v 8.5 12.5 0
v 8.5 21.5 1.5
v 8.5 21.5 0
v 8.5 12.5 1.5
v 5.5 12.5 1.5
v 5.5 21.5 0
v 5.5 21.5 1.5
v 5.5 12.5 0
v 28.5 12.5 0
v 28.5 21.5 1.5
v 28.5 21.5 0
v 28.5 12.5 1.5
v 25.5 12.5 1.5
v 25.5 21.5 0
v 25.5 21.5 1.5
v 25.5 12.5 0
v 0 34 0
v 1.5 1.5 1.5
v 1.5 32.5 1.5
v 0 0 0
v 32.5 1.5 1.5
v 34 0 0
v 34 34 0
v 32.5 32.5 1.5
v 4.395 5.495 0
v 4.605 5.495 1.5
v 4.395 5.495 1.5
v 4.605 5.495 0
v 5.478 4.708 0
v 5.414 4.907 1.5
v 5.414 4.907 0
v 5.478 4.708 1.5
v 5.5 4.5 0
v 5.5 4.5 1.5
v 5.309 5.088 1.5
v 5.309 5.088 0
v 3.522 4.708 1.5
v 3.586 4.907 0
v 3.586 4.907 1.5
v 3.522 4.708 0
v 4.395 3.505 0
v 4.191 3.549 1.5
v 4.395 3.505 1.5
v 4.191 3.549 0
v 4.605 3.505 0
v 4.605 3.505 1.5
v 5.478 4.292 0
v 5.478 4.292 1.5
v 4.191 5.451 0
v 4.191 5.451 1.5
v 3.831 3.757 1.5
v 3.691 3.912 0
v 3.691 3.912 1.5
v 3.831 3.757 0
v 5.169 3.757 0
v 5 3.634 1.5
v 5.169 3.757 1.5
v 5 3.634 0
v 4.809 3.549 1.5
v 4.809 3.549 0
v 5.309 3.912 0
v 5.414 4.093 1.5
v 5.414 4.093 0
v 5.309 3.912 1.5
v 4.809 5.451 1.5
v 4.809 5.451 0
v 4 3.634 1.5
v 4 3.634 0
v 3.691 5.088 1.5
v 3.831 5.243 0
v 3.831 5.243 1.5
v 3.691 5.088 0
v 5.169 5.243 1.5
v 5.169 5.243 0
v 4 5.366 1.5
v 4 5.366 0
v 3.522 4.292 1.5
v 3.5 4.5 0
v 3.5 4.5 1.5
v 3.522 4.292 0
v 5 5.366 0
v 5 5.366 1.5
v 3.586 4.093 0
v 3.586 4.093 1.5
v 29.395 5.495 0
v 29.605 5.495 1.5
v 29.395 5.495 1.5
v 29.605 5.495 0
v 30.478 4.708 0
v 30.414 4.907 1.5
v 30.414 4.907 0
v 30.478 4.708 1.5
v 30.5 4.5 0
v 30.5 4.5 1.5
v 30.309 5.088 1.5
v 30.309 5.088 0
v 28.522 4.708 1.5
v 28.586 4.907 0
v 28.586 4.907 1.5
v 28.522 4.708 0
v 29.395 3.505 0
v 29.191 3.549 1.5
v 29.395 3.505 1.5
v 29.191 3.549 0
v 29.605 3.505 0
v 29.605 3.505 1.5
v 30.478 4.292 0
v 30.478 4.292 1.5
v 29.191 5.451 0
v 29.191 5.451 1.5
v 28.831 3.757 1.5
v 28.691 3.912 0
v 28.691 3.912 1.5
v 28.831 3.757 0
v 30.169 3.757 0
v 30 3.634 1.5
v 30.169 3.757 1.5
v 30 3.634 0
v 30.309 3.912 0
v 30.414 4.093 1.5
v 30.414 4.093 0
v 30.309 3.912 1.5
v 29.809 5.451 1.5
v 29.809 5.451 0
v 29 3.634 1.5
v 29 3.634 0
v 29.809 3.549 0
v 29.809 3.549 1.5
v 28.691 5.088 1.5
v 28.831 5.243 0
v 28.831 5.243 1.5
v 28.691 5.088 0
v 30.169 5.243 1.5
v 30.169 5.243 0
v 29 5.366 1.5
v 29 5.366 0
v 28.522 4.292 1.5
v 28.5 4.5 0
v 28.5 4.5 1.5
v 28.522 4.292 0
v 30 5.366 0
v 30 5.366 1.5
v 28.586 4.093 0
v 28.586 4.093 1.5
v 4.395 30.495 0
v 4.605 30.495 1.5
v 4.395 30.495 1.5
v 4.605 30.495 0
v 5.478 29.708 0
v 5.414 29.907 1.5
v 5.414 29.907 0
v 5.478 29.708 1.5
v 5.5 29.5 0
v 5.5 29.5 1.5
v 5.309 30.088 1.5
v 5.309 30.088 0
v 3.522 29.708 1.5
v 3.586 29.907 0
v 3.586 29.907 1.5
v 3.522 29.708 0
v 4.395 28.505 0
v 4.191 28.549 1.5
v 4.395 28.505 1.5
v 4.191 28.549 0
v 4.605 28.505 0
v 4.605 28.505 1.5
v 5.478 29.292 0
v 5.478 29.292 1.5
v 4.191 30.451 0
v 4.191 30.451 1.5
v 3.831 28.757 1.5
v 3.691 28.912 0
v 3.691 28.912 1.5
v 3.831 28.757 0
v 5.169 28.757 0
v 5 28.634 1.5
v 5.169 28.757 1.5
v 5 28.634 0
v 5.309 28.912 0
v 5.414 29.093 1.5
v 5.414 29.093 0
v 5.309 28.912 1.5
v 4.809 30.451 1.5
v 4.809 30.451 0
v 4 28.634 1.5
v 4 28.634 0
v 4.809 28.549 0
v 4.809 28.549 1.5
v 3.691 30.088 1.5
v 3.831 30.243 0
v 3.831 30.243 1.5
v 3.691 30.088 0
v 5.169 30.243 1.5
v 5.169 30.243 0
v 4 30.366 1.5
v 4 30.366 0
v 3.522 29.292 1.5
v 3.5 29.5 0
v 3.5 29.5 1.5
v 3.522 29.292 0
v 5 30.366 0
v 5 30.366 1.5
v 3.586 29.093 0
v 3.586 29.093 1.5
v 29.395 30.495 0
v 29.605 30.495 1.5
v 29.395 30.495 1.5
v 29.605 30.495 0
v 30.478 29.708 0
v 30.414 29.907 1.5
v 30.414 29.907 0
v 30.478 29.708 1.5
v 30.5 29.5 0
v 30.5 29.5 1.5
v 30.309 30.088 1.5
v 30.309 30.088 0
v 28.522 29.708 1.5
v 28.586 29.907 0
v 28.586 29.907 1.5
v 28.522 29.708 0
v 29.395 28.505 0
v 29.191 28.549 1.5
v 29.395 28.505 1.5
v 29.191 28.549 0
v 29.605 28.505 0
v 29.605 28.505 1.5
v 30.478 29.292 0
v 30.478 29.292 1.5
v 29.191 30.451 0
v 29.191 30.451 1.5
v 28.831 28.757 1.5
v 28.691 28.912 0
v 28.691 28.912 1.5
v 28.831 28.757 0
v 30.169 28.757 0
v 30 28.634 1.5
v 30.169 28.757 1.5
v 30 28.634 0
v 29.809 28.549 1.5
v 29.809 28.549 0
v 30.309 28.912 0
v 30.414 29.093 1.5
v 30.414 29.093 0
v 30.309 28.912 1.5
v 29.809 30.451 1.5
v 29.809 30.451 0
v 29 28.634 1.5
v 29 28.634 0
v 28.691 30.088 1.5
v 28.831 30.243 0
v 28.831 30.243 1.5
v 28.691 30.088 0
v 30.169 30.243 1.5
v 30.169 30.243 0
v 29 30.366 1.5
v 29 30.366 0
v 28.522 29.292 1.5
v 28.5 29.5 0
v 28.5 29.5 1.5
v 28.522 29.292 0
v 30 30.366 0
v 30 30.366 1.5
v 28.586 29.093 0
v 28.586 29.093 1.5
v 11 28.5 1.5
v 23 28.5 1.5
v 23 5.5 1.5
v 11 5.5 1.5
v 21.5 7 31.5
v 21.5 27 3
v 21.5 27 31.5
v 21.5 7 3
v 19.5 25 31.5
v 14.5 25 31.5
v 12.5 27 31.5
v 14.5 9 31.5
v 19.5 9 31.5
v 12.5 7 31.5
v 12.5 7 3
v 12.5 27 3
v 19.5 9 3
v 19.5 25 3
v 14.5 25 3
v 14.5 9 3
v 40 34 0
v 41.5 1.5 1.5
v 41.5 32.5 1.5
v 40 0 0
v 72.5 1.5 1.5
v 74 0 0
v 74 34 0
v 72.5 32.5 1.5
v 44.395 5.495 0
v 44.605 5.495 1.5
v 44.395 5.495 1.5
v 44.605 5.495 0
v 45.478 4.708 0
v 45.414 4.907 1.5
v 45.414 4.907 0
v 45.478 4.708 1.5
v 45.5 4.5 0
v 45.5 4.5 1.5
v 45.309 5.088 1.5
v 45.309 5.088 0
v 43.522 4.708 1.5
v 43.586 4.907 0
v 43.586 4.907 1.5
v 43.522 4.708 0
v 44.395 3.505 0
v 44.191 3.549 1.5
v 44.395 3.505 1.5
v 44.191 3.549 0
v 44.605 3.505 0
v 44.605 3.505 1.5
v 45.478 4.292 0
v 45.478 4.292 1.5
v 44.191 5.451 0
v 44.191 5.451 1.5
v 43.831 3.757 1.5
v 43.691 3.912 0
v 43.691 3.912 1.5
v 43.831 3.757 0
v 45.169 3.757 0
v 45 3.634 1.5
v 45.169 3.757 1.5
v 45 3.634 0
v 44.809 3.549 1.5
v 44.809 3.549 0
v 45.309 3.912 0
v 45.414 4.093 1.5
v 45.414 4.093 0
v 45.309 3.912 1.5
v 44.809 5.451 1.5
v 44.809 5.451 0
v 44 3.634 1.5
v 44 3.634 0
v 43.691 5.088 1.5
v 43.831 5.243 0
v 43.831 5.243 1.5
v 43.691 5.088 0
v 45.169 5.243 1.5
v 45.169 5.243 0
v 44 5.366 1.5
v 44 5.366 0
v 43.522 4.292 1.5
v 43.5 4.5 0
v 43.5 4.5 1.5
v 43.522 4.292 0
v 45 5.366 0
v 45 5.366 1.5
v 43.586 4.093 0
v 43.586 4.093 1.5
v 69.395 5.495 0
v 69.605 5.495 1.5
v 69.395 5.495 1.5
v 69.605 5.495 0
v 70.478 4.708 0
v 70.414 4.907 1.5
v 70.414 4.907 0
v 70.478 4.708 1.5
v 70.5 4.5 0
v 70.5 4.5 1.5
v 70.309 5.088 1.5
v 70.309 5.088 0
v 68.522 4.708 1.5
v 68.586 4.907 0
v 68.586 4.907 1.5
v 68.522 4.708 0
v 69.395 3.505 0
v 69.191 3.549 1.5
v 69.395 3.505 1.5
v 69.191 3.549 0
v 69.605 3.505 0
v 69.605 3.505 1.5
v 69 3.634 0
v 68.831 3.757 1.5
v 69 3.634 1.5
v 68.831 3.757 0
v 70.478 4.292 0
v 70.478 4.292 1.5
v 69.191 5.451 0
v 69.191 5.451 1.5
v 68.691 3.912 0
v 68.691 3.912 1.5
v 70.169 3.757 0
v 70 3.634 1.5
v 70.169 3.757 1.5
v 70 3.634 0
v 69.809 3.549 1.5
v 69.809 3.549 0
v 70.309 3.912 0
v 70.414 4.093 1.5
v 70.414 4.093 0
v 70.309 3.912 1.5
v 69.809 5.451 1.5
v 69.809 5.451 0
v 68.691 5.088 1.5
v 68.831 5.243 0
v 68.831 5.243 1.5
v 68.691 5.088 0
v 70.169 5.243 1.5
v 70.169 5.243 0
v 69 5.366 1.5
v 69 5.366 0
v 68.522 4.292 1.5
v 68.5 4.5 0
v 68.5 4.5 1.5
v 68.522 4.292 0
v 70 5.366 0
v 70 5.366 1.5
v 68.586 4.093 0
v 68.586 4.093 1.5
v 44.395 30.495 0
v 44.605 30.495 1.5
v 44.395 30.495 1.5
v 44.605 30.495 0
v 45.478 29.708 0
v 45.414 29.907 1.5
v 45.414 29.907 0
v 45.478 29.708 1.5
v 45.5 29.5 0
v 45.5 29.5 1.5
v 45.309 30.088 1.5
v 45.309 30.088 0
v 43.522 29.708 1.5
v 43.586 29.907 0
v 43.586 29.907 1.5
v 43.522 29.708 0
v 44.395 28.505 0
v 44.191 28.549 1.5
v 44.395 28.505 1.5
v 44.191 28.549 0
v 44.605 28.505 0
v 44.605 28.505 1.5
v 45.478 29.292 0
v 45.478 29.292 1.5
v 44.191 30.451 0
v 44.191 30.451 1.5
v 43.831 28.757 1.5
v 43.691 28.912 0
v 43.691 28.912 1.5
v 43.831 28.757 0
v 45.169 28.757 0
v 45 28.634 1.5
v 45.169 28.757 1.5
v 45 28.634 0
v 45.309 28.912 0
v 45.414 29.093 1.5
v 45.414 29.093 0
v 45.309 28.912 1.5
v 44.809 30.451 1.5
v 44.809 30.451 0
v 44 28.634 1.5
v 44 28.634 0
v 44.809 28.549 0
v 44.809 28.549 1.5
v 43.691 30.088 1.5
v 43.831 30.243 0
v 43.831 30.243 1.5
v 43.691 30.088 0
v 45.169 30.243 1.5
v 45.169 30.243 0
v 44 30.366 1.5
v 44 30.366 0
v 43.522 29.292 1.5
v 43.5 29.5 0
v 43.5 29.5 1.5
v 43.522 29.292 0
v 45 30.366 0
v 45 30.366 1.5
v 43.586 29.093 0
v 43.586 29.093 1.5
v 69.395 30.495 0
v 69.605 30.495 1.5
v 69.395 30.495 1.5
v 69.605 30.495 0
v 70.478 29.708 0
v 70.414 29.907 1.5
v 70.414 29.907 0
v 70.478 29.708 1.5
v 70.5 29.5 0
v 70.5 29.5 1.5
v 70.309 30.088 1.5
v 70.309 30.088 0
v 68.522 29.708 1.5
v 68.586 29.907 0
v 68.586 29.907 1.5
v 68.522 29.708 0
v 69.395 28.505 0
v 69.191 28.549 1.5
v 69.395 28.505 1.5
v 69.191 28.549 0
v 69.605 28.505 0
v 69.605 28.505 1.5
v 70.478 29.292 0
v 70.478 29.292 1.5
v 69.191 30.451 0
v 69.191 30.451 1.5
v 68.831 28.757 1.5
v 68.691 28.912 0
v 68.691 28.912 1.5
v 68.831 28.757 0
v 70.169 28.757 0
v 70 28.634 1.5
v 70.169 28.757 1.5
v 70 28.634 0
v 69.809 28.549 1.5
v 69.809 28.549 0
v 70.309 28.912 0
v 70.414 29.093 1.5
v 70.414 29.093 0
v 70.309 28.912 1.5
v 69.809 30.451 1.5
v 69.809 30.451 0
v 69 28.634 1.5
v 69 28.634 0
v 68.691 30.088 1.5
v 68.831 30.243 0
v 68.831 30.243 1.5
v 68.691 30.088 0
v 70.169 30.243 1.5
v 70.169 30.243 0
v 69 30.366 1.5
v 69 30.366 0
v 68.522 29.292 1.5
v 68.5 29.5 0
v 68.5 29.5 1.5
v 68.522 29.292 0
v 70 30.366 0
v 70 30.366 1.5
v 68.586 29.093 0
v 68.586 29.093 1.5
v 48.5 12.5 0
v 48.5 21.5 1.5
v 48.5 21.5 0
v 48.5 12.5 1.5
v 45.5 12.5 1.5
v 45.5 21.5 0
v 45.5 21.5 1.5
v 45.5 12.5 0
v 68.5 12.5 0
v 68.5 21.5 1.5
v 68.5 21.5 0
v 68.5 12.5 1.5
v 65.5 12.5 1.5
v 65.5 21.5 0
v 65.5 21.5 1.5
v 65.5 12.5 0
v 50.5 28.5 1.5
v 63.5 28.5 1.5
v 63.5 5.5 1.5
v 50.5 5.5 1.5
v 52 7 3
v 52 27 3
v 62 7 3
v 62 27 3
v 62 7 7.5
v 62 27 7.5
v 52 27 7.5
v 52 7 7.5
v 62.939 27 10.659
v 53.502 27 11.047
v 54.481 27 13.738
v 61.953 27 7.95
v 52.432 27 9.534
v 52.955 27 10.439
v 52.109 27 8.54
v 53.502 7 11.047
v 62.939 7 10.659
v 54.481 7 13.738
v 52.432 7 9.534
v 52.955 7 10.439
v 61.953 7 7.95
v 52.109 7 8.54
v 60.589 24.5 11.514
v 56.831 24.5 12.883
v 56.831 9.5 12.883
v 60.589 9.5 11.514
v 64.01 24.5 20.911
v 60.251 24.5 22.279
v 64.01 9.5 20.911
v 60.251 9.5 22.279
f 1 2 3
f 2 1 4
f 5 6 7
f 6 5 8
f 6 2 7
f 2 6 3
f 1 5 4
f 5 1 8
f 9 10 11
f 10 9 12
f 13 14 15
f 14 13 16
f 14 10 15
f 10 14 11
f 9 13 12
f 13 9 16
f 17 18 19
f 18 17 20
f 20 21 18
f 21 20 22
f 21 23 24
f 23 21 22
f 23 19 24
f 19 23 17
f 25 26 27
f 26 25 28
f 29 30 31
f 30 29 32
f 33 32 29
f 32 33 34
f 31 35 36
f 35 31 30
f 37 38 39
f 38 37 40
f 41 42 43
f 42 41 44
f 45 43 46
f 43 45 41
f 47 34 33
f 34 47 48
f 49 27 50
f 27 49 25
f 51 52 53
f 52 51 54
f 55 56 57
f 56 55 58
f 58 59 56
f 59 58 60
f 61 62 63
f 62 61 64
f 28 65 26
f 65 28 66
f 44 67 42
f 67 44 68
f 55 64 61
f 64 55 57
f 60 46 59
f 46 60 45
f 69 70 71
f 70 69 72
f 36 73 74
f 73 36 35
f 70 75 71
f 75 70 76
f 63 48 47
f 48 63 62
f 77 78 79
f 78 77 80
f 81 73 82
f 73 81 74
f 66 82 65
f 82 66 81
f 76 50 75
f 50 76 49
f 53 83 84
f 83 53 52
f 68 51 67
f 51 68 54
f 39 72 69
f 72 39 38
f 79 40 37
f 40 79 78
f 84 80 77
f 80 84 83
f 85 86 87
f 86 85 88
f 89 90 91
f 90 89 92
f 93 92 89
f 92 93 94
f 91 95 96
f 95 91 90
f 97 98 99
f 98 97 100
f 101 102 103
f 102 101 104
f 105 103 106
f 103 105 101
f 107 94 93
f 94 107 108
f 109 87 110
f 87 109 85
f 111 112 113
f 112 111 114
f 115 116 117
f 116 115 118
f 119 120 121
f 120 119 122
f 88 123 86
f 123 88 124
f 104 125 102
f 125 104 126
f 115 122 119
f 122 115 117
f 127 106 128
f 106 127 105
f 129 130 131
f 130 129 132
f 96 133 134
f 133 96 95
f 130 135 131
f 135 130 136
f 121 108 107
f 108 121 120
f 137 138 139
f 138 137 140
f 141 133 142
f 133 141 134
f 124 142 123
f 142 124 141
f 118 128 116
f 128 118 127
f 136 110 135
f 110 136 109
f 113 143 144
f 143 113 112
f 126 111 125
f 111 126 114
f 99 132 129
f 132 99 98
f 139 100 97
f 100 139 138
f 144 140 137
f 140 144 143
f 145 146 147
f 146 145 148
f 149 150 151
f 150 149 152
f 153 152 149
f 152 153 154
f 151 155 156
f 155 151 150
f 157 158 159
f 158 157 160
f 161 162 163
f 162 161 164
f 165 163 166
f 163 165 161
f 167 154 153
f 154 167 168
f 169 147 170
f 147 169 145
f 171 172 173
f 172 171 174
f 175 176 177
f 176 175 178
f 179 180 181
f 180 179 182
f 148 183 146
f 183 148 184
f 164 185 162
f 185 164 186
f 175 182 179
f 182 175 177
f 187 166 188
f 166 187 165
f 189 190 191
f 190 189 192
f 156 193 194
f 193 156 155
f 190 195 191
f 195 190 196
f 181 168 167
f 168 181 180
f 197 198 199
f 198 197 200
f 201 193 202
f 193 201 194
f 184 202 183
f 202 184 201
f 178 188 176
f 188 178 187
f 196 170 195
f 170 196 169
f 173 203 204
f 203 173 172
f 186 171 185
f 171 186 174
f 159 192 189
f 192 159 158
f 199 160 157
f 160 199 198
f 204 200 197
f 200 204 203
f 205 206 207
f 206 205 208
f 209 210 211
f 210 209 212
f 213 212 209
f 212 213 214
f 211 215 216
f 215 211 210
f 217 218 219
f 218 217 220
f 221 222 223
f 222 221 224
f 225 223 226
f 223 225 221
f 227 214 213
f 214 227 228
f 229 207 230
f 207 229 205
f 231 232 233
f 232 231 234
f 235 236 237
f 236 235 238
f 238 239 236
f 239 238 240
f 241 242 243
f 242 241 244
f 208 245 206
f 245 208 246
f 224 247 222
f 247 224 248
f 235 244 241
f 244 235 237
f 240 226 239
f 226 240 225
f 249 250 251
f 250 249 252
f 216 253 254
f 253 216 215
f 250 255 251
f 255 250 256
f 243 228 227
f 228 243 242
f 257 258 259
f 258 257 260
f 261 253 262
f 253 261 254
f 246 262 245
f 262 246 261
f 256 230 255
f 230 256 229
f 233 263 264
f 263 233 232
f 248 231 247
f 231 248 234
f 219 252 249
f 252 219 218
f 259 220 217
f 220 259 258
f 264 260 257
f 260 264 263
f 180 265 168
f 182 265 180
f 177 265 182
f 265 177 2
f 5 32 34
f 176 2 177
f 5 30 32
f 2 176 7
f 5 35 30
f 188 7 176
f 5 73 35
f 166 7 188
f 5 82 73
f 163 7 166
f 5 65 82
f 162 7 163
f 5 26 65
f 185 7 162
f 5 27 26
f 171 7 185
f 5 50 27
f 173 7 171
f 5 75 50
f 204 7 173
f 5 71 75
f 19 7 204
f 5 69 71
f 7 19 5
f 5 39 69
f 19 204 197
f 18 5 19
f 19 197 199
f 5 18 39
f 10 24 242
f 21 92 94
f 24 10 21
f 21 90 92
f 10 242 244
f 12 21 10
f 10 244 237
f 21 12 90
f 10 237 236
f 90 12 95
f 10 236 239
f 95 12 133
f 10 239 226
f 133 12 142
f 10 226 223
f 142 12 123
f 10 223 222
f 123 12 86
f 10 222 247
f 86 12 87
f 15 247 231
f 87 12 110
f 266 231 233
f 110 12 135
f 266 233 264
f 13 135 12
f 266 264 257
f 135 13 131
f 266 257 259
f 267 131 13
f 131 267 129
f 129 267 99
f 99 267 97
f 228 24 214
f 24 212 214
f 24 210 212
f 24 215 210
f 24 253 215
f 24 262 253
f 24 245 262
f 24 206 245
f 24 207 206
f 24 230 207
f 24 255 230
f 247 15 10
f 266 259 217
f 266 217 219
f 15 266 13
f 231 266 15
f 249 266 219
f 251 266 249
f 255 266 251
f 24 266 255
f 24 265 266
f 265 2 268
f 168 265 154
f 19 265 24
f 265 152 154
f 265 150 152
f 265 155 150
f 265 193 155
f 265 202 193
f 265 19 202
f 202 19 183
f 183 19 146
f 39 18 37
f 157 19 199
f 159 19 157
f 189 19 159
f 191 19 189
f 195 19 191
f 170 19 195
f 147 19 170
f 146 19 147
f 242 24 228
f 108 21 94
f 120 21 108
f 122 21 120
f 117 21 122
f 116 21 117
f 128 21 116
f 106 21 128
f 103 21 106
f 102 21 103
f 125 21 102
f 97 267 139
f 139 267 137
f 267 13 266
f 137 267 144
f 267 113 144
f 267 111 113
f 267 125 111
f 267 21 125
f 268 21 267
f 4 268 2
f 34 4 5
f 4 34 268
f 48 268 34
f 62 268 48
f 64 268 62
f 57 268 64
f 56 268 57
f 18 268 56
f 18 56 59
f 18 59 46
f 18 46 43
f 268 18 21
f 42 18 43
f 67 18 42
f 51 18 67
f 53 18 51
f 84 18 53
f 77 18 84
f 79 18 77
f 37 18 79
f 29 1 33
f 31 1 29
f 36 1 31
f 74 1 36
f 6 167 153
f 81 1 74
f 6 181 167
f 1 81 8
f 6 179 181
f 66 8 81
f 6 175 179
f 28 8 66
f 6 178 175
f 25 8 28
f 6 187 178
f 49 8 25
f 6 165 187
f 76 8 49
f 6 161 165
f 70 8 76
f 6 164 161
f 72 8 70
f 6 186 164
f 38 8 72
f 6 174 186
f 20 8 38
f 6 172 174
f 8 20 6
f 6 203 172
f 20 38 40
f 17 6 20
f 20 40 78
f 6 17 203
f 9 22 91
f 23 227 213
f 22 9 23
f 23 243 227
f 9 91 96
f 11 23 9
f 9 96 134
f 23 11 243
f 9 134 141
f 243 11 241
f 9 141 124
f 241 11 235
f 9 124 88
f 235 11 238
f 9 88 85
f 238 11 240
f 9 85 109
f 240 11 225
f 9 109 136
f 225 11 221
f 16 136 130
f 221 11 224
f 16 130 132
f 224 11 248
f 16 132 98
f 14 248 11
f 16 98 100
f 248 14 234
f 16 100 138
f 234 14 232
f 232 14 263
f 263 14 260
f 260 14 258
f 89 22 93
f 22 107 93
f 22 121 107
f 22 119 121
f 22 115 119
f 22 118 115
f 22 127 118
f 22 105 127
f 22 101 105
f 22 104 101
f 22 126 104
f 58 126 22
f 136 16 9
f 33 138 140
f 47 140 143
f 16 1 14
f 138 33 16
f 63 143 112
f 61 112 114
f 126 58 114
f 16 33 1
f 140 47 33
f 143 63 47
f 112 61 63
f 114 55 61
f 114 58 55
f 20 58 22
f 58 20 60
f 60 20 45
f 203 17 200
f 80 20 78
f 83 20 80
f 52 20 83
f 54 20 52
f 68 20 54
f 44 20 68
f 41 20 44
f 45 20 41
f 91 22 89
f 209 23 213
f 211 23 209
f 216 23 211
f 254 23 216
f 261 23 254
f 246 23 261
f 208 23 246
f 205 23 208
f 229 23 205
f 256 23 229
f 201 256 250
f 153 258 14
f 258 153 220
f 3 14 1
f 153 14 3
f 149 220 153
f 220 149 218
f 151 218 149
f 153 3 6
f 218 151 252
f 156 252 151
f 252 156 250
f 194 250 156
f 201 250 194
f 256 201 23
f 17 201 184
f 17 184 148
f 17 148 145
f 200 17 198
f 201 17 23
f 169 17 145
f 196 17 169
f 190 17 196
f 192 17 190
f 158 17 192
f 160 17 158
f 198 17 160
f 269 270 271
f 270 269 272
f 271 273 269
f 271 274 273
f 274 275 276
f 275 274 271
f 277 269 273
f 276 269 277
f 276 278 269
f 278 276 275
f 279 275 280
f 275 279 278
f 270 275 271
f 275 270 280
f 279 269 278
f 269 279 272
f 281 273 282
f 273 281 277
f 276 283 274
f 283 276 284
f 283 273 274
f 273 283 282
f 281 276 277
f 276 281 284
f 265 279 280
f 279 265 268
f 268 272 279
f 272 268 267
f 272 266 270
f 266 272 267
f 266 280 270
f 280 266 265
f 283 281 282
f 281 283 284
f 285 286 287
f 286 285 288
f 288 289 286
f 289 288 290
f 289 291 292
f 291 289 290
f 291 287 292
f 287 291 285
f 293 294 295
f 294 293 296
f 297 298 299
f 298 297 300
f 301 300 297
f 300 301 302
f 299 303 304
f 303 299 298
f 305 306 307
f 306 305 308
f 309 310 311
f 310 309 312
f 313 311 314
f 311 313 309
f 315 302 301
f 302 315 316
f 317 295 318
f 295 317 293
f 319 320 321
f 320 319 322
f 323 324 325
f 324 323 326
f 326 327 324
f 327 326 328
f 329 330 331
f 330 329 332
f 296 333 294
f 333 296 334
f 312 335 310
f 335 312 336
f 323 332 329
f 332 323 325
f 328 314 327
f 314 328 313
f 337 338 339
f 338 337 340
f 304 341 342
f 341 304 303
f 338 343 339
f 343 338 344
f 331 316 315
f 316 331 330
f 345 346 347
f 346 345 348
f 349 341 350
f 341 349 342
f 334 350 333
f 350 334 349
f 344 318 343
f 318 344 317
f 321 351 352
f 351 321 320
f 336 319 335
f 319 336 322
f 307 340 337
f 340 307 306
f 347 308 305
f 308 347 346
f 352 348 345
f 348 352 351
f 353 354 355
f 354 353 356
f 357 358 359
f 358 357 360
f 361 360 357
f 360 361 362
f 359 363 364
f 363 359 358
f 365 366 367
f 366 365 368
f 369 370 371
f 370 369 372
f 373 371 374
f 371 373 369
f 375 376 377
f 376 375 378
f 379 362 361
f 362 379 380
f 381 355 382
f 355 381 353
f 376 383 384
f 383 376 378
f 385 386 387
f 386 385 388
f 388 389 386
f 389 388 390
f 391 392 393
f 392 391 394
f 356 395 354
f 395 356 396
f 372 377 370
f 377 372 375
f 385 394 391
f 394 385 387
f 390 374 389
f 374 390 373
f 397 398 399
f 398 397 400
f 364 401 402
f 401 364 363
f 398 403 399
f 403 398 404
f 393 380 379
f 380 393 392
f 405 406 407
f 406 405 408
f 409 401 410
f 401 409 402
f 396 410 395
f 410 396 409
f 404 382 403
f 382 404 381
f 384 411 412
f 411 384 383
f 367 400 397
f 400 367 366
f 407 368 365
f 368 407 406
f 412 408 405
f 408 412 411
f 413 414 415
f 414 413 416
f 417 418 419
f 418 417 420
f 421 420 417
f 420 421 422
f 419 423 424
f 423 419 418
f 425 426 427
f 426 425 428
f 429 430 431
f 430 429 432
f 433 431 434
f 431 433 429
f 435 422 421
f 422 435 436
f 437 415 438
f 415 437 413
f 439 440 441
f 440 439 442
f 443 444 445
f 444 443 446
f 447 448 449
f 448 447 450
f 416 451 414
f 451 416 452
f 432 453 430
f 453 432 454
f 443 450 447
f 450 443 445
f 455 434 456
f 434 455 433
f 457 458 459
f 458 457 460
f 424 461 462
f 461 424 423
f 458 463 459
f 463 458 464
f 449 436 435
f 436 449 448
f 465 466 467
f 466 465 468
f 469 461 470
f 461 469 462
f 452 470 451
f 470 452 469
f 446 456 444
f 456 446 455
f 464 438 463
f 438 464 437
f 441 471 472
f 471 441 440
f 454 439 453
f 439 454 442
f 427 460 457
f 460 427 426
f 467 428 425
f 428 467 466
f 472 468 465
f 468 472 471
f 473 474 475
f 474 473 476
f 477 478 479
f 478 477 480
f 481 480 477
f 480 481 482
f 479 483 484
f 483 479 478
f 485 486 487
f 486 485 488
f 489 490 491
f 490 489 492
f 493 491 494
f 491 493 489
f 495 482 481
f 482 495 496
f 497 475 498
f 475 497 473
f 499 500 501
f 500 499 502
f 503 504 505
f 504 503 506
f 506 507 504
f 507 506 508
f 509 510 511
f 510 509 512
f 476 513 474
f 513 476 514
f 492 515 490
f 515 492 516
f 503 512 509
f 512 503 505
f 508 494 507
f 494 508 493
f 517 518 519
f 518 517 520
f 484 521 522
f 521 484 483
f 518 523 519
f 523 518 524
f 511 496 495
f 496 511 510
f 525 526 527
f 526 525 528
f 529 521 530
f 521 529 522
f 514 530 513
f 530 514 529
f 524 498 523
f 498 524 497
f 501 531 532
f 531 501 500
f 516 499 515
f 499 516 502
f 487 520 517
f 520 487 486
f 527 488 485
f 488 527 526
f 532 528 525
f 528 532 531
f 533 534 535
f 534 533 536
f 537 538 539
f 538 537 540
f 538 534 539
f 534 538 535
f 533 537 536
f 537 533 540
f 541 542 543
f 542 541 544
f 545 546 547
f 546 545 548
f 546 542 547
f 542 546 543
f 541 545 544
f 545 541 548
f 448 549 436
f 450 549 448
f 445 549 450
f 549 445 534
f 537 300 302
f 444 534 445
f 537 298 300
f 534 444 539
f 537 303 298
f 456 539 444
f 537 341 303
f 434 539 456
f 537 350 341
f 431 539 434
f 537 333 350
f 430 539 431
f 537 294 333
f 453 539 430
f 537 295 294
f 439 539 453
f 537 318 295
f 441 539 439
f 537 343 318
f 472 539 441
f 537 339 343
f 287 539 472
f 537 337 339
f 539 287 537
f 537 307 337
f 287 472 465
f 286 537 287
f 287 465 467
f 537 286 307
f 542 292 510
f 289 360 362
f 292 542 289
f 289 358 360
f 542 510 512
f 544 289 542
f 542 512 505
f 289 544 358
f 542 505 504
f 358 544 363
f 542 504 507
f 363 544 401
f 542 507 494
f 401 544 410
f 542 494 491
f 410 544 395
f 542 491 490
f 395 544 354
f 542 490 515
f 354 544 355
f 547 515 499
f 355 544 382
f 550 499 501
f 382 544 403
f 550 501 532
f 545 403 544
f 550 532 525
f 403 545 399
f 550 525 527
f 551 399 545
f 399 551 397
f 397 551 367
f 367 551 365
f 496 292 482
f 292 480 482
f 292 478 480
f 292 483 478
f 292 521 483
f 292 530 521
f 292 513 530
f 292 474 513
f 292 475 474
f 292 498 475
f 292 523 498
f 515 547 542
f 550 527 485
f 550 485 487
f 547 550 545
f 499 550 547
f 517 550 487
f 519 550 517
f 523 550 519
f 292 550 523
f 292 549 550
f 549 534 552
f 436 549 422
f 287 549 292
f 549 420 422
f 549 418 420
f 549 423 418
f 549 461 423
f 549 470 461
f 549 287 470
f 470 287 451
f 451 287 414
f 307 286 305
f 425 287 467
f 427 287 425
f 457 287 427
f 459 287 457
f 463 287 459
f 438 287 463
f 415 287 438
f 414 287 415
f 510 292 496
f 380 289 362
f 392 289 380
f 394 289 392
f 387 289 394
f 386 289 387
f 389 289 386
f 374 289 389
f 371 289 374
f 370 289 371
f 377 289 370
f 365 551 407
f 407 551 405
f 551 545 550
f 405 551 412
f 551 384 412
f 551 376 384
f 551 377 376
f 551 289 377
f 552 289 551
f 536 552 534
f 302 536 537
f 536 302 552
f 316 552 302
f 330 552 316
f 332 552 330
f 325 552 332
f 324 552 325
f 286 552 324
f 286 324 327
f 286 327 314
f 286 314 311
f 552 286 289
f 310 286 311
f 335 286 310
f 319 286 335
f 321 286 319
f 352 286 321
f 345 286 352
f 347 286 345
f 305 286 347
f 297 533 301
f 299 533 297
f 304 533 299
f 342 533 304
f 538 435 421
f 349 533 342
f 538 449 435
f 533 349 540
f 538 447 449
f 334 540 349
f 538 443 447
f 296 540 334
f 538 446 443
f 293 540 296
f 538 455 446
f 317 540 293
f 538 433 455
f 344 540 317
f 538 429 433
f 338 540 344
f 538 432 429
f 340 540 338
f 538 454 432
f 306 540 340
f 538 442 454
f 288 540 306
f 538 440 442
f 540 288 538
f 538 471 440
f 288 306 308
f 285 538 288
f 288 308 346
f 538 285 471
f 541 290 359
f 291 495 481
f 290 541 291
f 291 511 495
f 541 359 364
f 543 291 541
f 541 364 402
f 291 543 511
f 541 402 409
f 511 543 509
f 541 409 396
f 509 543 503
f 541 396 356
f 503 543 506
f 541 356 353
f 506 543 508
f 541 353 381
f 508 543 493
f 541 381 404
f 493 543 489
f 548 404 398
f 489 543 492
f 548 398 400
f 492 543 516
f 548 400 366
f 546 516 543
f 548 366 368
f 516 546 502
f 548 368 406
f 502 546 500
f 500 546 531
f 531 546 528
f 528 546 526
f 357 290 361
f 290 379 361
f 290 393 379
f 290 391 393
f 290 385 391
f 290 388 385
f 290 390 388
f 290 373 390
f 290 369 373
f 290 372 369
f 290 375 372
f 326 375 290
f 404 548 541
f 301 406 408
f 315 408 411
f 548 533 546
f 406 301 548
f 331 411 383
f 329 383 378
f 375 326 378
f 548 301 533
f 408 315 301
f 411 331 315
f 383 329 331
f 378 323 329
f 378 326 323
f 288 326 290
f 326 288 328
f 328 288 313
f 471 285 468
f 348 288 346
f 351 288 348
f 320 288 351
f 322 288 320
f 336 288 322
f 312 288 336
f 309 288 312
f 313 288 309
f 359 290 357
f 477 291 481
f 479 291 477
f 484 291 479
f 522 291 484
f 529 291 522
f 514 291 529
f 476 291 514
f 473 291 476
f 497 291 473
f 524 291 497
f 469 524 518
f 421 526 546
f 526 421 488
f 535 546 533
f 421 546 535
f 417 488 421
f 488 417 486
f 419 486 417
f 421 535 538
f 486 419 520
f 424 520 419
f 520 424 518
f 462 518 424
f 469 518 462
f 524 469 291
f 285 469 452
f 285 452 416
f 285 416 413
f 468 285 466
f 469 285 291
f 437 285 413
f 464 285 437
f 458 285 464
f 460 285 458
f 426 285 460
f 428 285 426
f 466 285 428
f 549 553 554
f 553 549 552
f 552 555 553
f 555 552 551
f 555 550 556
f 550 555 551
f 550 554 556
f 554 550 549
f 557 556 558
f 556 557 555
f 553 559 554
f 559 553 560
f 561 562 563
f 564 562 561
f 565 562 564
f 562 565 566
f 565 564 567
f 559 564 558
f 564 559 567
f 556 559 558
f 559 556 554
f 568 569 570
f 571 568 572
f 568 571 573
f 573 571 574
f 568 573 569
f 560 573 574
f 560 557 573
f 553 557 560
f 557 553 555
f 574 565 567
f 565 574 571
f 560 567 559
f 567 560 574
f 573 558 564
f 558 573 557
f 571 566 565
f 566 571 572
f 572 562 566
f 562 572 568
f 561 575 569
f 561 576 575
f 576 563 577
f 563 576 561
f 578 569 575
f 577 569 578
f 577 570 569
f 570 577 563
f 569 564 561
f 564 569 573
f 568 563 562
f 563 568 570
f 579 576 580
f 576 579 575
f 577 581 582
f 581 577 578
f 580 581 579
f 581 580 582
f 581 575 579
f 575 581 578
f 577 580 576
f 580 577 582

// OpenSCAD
// title      : RoboGen parametric A part
// author     : Alice Concordel
// date     : 01.12.2016

//The parametric part is in two parts, A and B. They should be printed  as two parts then assembled with glue.
parametricJointPartA(0.03,0,0); //the first parameter is the length of the joint, the second parameter is the angle beta (only for non-planar robots)
translate([40, 0, 0]) parametricJointPartB(0,20,0); //the parameter is the angle of the parametric part

module parametricJointPartA(length, alpha, beta)
{
//plate parameters
	lengthSlide = 34;
	widthSlide = 34;
	heightSlide = 1.5;

	radiusHole = 1;

//wire hole parameters
	lengthWire = 3;
	widthWire = 9;
	heightWire = heightSlide;

//shaft part parameters
	lengthShaft = 20;
	widthShaft = 9;

// apply transformations to the parameter
length = length*1000; //convert to mm
	union()
	{
		difference()
		{
			// starting plate
			cube([lengthSlide,widthSlide,heightSlide]);
		
			union()
			{
			// chamfer the edges
				rotate ([0,-45,0]) cube([3,widthSlide,3]);
				rotate([45,0,0]) cube([lengthSlide,3,3]);
				translate([lengthSlide,0,0]) rotate([0,-45,0]) cube([3,widthSlide,3]);
				translate([0,widthSlide,0]) rotate([45,0,0]) cube([lengthSlide,3,3]);

			// holes in the plate
					//round
				translate([4.5,4.5,-0.5]) cylinder(r = radiusHole, h = heightSlide+1, $fn = 30);
				translate([lengthSlide-4.5,4.5,-0.5]) cylinder(r = radiusHole, h = heightSlide+1, $fn = 30);
				translate([4.5,widthSlide-4.5,-0.5]) cylinder(r = radiusHole, h = heightSlide+1, $fn = 30);
				translate([lengthSlide-4.5,widthSlide-4.5,-0.5]) cylinder(r = radiusHole, h = heightSlide+1, $fn = 30);
					
					//rectangular holes (only present if the shaft is not rotated)
				if(beta == 0){
				translate([7-lengthWire/2,widthSlide/2-widthWire/2,-0.5]) cube([lengthWire,widthWire,heightSlide+1]);
				translate([lengthSlide-7-lengthWire/2,widthSlide/2-widthWire/2,-0.5]) cube([lengthWire,widthWire,heightSlide+1]);
				}
			}
		}

	//the shaft
		//========================== beta paramter below: rotates the whole thing if needed
		translate([lengthSlide/2,widthSlide/2,0]) rotate([0,0,beta]) translate([-lengthSlide/2,-widthSlide/2,0]) 
	union()
	{
		//main long part 
		//========================== length parameter below
			difference()
			{
			translate([lengthSlide/2-widthShaft/2,widthSlide/2-lengthShaft/2,0]) cube([widthShaft,lengthShaft,length+heightSlide]);
			translate([lengthSlide/2-(widthShaft-4)/2,widthSlide/2-(lengthShaft-4)/2,heightSlide]) cube([widthShaft-4,lengthShaft-4,length+0.5]);
			}

		//chamfer the edges of the shaft base
			difference()
			{
				translate([lengthSlide/2-(widthShaft+3)/2,widthSlide/2-(lengthShaft+3)/2]) cube([widthShaft+3,lengthShaft+3,3]);
				union()
				{
				translate([lengthSlide/2-widthShaft/2-1.5,0,1.5]) rotate ([0,-45,0]) cube([1.5*sqrt(2),widthSlide,1.5*sqrt(2)]);
				translate([0,widthSlide/2-lengthShaft/2-1.5,1.5]) rotate([45,0,0]) cube([lengthSlide,1.5*sqrt(2),1.5*sqrt(2)]);
				translate([lengthSlide/2+widthShaft/2+1.5,0,1.5]) rotate([0,-45,0]) cube([1.5*sqrt(2),widthSlide,1.5*sqrt(2)]);
				translate([0,widthSlide/2+lengthShaft/2+1.5,1.5]) rotate([45,0,0]) cube([lengthSlide,1.5*sqrt(2),1.5*sqrt(2)]);
				}
			}
		}
	}
}

module parametricJointPartB(length,alpha,beta)
{
//plate parameters
	lengthSlide = 34;
	widthSlide = 34;
	heightSlide = 1.5;
	
	radiusHole = 1;

//wire hole parameters
	lengthWire = 3;
	widthWire = 9;
	heightWire = heightSlide;

//joint base parameters
	lengthBase = 10;
	widthBase = 20;
	heightBase = 6;
	
//cylinder parameters
	radiusCylinderBase = 5;
	heightCylinderBase = 20;
	
//rotating cube top part parameters
	lengthTop = 9;
	widthTop = 20;
	heightTop = 5;
	
	lengthEnd = 4;
	widthEnd = 15;
	heightEnd = 10;
	
	
	union()
	{
		difference()
		{
			// starting plate
			cube([lengthSlide,widthSlide,1.5]);
			
			union()
			{
			// chamfer the edges of the plate
				rotate ([0,-45,0]) cube([3,widthSlide,3]);
				rotate([45,0,0]) cube([lengthSlide,3,3]);
				translate([lengthSlide,0,0]) rotate([0,-45,0]) cube([3,widthSlide,3]);
				translate([0,widthSlide,0]) rotate([45,0,0]) cube([lengthSlide,3,3]);

			// holes in the plate
					//round holes
				translate([4.5,4.5,-0.5]) cylinder(r = radiusHole, h = heightSlide+1, $fn = 30);
				translate([lengthSlide-4.5,4.5,-0.5]) cylinder(r = radiusHole, h = heightSlide+1, $fn = 30);
				translate([4.5,widthSlide-4.5,-0.5]) cylinder(r = radiusHole, h = heightSlide+1, $fn = 30);
				translate([lengthSlide-4.5,widthSlide-4.5,-0.5]) cylinder(r = radiusHole, h = heightSlide+1, $fn = 30);
				
					//rectangular wire holes
				translate([7-lengthWire/2,widthSlide/2-widthWire/2,-0.5]) cube([lengthWire,widthWire,heightWire+1]);
				translate([lengthSlide-7-lengthWire/2,widthSlide/2-widthWire/2,-0.5]) cube([lengthWire,widthWire,heightWire+1]);
			}
		}
		// base of shaft part
		translate([lengthSlide/2-10/2,widthSlide/2-20/2,0]) cube([lengthBase,widthBase,heightBase+heightSlide]);
	
		//chamfer the edges of the shaft base
		difference()
		{
			translate([lengthSlide/2-(lengthBase+3)/2,widthSlide/2-(widthBase+3)/2]) cube([lengthBase+3,widthBase+3,3]);
			union()
			{
			translate([lengthSlide/2-lengthBase/2-heightSlide,0,heightSlide]) rotate ([0,-45,0]) cube([heightSlide*sqrt(2),34,heightSlide*sqrt(2)]);
			translate([0,widthSlide/2-widthBase/2-heightSlide,heightSlide]) rotate([45,0,0]) cube([lengthSlide,heightSlide*sqrt(2),heightSlide*sqrt(2)]);
			translate([lengthSlide/2+lengthBase/2+heightSlide,0,heightSlide]) rotate([0,-45,0]) cube([heightSlide*sqrt(2),34,heightSlide*sqrt(2)]);
			translate([0,widthSlide/2+widthBase/2+heightSlide,heightSlide]) rotate([45,0,0]) cube([lengthSlide,heightSlide*sqrt(2),heightSlide*sqrt(2)]);
			}
		}

		// cylinder or rounded part
		translate([lengthSlide/2,widthSlide/2-heightCylinderBase/2,heightBase+heightSlide]) rotate([-90,0,0]) cylinder(r = radiusCylinderBase, h = heightCylinderBase, $fn = 30);
		
		// next part of join = Box over one smaller Box
		//========================== angle parameter below
		translate([lengthSlide/2,widthSlide/2-widthTop/2,heightSlide+heightBase]) rotate([0,alpha,0]) translate([-lengthTop/2,0,0]) cube([lengthTop,widthTop,heightTop]);
		translate([lengthSlide/2,widthSlide/2-widthEnd/2,heightSlide+heightBase]) rotate([0,alpha,0]) translate([-lengthEnd/2,0,0]) cube([lengthEnd,widthEnd,heightEnd+heightTop]);
	}
}
